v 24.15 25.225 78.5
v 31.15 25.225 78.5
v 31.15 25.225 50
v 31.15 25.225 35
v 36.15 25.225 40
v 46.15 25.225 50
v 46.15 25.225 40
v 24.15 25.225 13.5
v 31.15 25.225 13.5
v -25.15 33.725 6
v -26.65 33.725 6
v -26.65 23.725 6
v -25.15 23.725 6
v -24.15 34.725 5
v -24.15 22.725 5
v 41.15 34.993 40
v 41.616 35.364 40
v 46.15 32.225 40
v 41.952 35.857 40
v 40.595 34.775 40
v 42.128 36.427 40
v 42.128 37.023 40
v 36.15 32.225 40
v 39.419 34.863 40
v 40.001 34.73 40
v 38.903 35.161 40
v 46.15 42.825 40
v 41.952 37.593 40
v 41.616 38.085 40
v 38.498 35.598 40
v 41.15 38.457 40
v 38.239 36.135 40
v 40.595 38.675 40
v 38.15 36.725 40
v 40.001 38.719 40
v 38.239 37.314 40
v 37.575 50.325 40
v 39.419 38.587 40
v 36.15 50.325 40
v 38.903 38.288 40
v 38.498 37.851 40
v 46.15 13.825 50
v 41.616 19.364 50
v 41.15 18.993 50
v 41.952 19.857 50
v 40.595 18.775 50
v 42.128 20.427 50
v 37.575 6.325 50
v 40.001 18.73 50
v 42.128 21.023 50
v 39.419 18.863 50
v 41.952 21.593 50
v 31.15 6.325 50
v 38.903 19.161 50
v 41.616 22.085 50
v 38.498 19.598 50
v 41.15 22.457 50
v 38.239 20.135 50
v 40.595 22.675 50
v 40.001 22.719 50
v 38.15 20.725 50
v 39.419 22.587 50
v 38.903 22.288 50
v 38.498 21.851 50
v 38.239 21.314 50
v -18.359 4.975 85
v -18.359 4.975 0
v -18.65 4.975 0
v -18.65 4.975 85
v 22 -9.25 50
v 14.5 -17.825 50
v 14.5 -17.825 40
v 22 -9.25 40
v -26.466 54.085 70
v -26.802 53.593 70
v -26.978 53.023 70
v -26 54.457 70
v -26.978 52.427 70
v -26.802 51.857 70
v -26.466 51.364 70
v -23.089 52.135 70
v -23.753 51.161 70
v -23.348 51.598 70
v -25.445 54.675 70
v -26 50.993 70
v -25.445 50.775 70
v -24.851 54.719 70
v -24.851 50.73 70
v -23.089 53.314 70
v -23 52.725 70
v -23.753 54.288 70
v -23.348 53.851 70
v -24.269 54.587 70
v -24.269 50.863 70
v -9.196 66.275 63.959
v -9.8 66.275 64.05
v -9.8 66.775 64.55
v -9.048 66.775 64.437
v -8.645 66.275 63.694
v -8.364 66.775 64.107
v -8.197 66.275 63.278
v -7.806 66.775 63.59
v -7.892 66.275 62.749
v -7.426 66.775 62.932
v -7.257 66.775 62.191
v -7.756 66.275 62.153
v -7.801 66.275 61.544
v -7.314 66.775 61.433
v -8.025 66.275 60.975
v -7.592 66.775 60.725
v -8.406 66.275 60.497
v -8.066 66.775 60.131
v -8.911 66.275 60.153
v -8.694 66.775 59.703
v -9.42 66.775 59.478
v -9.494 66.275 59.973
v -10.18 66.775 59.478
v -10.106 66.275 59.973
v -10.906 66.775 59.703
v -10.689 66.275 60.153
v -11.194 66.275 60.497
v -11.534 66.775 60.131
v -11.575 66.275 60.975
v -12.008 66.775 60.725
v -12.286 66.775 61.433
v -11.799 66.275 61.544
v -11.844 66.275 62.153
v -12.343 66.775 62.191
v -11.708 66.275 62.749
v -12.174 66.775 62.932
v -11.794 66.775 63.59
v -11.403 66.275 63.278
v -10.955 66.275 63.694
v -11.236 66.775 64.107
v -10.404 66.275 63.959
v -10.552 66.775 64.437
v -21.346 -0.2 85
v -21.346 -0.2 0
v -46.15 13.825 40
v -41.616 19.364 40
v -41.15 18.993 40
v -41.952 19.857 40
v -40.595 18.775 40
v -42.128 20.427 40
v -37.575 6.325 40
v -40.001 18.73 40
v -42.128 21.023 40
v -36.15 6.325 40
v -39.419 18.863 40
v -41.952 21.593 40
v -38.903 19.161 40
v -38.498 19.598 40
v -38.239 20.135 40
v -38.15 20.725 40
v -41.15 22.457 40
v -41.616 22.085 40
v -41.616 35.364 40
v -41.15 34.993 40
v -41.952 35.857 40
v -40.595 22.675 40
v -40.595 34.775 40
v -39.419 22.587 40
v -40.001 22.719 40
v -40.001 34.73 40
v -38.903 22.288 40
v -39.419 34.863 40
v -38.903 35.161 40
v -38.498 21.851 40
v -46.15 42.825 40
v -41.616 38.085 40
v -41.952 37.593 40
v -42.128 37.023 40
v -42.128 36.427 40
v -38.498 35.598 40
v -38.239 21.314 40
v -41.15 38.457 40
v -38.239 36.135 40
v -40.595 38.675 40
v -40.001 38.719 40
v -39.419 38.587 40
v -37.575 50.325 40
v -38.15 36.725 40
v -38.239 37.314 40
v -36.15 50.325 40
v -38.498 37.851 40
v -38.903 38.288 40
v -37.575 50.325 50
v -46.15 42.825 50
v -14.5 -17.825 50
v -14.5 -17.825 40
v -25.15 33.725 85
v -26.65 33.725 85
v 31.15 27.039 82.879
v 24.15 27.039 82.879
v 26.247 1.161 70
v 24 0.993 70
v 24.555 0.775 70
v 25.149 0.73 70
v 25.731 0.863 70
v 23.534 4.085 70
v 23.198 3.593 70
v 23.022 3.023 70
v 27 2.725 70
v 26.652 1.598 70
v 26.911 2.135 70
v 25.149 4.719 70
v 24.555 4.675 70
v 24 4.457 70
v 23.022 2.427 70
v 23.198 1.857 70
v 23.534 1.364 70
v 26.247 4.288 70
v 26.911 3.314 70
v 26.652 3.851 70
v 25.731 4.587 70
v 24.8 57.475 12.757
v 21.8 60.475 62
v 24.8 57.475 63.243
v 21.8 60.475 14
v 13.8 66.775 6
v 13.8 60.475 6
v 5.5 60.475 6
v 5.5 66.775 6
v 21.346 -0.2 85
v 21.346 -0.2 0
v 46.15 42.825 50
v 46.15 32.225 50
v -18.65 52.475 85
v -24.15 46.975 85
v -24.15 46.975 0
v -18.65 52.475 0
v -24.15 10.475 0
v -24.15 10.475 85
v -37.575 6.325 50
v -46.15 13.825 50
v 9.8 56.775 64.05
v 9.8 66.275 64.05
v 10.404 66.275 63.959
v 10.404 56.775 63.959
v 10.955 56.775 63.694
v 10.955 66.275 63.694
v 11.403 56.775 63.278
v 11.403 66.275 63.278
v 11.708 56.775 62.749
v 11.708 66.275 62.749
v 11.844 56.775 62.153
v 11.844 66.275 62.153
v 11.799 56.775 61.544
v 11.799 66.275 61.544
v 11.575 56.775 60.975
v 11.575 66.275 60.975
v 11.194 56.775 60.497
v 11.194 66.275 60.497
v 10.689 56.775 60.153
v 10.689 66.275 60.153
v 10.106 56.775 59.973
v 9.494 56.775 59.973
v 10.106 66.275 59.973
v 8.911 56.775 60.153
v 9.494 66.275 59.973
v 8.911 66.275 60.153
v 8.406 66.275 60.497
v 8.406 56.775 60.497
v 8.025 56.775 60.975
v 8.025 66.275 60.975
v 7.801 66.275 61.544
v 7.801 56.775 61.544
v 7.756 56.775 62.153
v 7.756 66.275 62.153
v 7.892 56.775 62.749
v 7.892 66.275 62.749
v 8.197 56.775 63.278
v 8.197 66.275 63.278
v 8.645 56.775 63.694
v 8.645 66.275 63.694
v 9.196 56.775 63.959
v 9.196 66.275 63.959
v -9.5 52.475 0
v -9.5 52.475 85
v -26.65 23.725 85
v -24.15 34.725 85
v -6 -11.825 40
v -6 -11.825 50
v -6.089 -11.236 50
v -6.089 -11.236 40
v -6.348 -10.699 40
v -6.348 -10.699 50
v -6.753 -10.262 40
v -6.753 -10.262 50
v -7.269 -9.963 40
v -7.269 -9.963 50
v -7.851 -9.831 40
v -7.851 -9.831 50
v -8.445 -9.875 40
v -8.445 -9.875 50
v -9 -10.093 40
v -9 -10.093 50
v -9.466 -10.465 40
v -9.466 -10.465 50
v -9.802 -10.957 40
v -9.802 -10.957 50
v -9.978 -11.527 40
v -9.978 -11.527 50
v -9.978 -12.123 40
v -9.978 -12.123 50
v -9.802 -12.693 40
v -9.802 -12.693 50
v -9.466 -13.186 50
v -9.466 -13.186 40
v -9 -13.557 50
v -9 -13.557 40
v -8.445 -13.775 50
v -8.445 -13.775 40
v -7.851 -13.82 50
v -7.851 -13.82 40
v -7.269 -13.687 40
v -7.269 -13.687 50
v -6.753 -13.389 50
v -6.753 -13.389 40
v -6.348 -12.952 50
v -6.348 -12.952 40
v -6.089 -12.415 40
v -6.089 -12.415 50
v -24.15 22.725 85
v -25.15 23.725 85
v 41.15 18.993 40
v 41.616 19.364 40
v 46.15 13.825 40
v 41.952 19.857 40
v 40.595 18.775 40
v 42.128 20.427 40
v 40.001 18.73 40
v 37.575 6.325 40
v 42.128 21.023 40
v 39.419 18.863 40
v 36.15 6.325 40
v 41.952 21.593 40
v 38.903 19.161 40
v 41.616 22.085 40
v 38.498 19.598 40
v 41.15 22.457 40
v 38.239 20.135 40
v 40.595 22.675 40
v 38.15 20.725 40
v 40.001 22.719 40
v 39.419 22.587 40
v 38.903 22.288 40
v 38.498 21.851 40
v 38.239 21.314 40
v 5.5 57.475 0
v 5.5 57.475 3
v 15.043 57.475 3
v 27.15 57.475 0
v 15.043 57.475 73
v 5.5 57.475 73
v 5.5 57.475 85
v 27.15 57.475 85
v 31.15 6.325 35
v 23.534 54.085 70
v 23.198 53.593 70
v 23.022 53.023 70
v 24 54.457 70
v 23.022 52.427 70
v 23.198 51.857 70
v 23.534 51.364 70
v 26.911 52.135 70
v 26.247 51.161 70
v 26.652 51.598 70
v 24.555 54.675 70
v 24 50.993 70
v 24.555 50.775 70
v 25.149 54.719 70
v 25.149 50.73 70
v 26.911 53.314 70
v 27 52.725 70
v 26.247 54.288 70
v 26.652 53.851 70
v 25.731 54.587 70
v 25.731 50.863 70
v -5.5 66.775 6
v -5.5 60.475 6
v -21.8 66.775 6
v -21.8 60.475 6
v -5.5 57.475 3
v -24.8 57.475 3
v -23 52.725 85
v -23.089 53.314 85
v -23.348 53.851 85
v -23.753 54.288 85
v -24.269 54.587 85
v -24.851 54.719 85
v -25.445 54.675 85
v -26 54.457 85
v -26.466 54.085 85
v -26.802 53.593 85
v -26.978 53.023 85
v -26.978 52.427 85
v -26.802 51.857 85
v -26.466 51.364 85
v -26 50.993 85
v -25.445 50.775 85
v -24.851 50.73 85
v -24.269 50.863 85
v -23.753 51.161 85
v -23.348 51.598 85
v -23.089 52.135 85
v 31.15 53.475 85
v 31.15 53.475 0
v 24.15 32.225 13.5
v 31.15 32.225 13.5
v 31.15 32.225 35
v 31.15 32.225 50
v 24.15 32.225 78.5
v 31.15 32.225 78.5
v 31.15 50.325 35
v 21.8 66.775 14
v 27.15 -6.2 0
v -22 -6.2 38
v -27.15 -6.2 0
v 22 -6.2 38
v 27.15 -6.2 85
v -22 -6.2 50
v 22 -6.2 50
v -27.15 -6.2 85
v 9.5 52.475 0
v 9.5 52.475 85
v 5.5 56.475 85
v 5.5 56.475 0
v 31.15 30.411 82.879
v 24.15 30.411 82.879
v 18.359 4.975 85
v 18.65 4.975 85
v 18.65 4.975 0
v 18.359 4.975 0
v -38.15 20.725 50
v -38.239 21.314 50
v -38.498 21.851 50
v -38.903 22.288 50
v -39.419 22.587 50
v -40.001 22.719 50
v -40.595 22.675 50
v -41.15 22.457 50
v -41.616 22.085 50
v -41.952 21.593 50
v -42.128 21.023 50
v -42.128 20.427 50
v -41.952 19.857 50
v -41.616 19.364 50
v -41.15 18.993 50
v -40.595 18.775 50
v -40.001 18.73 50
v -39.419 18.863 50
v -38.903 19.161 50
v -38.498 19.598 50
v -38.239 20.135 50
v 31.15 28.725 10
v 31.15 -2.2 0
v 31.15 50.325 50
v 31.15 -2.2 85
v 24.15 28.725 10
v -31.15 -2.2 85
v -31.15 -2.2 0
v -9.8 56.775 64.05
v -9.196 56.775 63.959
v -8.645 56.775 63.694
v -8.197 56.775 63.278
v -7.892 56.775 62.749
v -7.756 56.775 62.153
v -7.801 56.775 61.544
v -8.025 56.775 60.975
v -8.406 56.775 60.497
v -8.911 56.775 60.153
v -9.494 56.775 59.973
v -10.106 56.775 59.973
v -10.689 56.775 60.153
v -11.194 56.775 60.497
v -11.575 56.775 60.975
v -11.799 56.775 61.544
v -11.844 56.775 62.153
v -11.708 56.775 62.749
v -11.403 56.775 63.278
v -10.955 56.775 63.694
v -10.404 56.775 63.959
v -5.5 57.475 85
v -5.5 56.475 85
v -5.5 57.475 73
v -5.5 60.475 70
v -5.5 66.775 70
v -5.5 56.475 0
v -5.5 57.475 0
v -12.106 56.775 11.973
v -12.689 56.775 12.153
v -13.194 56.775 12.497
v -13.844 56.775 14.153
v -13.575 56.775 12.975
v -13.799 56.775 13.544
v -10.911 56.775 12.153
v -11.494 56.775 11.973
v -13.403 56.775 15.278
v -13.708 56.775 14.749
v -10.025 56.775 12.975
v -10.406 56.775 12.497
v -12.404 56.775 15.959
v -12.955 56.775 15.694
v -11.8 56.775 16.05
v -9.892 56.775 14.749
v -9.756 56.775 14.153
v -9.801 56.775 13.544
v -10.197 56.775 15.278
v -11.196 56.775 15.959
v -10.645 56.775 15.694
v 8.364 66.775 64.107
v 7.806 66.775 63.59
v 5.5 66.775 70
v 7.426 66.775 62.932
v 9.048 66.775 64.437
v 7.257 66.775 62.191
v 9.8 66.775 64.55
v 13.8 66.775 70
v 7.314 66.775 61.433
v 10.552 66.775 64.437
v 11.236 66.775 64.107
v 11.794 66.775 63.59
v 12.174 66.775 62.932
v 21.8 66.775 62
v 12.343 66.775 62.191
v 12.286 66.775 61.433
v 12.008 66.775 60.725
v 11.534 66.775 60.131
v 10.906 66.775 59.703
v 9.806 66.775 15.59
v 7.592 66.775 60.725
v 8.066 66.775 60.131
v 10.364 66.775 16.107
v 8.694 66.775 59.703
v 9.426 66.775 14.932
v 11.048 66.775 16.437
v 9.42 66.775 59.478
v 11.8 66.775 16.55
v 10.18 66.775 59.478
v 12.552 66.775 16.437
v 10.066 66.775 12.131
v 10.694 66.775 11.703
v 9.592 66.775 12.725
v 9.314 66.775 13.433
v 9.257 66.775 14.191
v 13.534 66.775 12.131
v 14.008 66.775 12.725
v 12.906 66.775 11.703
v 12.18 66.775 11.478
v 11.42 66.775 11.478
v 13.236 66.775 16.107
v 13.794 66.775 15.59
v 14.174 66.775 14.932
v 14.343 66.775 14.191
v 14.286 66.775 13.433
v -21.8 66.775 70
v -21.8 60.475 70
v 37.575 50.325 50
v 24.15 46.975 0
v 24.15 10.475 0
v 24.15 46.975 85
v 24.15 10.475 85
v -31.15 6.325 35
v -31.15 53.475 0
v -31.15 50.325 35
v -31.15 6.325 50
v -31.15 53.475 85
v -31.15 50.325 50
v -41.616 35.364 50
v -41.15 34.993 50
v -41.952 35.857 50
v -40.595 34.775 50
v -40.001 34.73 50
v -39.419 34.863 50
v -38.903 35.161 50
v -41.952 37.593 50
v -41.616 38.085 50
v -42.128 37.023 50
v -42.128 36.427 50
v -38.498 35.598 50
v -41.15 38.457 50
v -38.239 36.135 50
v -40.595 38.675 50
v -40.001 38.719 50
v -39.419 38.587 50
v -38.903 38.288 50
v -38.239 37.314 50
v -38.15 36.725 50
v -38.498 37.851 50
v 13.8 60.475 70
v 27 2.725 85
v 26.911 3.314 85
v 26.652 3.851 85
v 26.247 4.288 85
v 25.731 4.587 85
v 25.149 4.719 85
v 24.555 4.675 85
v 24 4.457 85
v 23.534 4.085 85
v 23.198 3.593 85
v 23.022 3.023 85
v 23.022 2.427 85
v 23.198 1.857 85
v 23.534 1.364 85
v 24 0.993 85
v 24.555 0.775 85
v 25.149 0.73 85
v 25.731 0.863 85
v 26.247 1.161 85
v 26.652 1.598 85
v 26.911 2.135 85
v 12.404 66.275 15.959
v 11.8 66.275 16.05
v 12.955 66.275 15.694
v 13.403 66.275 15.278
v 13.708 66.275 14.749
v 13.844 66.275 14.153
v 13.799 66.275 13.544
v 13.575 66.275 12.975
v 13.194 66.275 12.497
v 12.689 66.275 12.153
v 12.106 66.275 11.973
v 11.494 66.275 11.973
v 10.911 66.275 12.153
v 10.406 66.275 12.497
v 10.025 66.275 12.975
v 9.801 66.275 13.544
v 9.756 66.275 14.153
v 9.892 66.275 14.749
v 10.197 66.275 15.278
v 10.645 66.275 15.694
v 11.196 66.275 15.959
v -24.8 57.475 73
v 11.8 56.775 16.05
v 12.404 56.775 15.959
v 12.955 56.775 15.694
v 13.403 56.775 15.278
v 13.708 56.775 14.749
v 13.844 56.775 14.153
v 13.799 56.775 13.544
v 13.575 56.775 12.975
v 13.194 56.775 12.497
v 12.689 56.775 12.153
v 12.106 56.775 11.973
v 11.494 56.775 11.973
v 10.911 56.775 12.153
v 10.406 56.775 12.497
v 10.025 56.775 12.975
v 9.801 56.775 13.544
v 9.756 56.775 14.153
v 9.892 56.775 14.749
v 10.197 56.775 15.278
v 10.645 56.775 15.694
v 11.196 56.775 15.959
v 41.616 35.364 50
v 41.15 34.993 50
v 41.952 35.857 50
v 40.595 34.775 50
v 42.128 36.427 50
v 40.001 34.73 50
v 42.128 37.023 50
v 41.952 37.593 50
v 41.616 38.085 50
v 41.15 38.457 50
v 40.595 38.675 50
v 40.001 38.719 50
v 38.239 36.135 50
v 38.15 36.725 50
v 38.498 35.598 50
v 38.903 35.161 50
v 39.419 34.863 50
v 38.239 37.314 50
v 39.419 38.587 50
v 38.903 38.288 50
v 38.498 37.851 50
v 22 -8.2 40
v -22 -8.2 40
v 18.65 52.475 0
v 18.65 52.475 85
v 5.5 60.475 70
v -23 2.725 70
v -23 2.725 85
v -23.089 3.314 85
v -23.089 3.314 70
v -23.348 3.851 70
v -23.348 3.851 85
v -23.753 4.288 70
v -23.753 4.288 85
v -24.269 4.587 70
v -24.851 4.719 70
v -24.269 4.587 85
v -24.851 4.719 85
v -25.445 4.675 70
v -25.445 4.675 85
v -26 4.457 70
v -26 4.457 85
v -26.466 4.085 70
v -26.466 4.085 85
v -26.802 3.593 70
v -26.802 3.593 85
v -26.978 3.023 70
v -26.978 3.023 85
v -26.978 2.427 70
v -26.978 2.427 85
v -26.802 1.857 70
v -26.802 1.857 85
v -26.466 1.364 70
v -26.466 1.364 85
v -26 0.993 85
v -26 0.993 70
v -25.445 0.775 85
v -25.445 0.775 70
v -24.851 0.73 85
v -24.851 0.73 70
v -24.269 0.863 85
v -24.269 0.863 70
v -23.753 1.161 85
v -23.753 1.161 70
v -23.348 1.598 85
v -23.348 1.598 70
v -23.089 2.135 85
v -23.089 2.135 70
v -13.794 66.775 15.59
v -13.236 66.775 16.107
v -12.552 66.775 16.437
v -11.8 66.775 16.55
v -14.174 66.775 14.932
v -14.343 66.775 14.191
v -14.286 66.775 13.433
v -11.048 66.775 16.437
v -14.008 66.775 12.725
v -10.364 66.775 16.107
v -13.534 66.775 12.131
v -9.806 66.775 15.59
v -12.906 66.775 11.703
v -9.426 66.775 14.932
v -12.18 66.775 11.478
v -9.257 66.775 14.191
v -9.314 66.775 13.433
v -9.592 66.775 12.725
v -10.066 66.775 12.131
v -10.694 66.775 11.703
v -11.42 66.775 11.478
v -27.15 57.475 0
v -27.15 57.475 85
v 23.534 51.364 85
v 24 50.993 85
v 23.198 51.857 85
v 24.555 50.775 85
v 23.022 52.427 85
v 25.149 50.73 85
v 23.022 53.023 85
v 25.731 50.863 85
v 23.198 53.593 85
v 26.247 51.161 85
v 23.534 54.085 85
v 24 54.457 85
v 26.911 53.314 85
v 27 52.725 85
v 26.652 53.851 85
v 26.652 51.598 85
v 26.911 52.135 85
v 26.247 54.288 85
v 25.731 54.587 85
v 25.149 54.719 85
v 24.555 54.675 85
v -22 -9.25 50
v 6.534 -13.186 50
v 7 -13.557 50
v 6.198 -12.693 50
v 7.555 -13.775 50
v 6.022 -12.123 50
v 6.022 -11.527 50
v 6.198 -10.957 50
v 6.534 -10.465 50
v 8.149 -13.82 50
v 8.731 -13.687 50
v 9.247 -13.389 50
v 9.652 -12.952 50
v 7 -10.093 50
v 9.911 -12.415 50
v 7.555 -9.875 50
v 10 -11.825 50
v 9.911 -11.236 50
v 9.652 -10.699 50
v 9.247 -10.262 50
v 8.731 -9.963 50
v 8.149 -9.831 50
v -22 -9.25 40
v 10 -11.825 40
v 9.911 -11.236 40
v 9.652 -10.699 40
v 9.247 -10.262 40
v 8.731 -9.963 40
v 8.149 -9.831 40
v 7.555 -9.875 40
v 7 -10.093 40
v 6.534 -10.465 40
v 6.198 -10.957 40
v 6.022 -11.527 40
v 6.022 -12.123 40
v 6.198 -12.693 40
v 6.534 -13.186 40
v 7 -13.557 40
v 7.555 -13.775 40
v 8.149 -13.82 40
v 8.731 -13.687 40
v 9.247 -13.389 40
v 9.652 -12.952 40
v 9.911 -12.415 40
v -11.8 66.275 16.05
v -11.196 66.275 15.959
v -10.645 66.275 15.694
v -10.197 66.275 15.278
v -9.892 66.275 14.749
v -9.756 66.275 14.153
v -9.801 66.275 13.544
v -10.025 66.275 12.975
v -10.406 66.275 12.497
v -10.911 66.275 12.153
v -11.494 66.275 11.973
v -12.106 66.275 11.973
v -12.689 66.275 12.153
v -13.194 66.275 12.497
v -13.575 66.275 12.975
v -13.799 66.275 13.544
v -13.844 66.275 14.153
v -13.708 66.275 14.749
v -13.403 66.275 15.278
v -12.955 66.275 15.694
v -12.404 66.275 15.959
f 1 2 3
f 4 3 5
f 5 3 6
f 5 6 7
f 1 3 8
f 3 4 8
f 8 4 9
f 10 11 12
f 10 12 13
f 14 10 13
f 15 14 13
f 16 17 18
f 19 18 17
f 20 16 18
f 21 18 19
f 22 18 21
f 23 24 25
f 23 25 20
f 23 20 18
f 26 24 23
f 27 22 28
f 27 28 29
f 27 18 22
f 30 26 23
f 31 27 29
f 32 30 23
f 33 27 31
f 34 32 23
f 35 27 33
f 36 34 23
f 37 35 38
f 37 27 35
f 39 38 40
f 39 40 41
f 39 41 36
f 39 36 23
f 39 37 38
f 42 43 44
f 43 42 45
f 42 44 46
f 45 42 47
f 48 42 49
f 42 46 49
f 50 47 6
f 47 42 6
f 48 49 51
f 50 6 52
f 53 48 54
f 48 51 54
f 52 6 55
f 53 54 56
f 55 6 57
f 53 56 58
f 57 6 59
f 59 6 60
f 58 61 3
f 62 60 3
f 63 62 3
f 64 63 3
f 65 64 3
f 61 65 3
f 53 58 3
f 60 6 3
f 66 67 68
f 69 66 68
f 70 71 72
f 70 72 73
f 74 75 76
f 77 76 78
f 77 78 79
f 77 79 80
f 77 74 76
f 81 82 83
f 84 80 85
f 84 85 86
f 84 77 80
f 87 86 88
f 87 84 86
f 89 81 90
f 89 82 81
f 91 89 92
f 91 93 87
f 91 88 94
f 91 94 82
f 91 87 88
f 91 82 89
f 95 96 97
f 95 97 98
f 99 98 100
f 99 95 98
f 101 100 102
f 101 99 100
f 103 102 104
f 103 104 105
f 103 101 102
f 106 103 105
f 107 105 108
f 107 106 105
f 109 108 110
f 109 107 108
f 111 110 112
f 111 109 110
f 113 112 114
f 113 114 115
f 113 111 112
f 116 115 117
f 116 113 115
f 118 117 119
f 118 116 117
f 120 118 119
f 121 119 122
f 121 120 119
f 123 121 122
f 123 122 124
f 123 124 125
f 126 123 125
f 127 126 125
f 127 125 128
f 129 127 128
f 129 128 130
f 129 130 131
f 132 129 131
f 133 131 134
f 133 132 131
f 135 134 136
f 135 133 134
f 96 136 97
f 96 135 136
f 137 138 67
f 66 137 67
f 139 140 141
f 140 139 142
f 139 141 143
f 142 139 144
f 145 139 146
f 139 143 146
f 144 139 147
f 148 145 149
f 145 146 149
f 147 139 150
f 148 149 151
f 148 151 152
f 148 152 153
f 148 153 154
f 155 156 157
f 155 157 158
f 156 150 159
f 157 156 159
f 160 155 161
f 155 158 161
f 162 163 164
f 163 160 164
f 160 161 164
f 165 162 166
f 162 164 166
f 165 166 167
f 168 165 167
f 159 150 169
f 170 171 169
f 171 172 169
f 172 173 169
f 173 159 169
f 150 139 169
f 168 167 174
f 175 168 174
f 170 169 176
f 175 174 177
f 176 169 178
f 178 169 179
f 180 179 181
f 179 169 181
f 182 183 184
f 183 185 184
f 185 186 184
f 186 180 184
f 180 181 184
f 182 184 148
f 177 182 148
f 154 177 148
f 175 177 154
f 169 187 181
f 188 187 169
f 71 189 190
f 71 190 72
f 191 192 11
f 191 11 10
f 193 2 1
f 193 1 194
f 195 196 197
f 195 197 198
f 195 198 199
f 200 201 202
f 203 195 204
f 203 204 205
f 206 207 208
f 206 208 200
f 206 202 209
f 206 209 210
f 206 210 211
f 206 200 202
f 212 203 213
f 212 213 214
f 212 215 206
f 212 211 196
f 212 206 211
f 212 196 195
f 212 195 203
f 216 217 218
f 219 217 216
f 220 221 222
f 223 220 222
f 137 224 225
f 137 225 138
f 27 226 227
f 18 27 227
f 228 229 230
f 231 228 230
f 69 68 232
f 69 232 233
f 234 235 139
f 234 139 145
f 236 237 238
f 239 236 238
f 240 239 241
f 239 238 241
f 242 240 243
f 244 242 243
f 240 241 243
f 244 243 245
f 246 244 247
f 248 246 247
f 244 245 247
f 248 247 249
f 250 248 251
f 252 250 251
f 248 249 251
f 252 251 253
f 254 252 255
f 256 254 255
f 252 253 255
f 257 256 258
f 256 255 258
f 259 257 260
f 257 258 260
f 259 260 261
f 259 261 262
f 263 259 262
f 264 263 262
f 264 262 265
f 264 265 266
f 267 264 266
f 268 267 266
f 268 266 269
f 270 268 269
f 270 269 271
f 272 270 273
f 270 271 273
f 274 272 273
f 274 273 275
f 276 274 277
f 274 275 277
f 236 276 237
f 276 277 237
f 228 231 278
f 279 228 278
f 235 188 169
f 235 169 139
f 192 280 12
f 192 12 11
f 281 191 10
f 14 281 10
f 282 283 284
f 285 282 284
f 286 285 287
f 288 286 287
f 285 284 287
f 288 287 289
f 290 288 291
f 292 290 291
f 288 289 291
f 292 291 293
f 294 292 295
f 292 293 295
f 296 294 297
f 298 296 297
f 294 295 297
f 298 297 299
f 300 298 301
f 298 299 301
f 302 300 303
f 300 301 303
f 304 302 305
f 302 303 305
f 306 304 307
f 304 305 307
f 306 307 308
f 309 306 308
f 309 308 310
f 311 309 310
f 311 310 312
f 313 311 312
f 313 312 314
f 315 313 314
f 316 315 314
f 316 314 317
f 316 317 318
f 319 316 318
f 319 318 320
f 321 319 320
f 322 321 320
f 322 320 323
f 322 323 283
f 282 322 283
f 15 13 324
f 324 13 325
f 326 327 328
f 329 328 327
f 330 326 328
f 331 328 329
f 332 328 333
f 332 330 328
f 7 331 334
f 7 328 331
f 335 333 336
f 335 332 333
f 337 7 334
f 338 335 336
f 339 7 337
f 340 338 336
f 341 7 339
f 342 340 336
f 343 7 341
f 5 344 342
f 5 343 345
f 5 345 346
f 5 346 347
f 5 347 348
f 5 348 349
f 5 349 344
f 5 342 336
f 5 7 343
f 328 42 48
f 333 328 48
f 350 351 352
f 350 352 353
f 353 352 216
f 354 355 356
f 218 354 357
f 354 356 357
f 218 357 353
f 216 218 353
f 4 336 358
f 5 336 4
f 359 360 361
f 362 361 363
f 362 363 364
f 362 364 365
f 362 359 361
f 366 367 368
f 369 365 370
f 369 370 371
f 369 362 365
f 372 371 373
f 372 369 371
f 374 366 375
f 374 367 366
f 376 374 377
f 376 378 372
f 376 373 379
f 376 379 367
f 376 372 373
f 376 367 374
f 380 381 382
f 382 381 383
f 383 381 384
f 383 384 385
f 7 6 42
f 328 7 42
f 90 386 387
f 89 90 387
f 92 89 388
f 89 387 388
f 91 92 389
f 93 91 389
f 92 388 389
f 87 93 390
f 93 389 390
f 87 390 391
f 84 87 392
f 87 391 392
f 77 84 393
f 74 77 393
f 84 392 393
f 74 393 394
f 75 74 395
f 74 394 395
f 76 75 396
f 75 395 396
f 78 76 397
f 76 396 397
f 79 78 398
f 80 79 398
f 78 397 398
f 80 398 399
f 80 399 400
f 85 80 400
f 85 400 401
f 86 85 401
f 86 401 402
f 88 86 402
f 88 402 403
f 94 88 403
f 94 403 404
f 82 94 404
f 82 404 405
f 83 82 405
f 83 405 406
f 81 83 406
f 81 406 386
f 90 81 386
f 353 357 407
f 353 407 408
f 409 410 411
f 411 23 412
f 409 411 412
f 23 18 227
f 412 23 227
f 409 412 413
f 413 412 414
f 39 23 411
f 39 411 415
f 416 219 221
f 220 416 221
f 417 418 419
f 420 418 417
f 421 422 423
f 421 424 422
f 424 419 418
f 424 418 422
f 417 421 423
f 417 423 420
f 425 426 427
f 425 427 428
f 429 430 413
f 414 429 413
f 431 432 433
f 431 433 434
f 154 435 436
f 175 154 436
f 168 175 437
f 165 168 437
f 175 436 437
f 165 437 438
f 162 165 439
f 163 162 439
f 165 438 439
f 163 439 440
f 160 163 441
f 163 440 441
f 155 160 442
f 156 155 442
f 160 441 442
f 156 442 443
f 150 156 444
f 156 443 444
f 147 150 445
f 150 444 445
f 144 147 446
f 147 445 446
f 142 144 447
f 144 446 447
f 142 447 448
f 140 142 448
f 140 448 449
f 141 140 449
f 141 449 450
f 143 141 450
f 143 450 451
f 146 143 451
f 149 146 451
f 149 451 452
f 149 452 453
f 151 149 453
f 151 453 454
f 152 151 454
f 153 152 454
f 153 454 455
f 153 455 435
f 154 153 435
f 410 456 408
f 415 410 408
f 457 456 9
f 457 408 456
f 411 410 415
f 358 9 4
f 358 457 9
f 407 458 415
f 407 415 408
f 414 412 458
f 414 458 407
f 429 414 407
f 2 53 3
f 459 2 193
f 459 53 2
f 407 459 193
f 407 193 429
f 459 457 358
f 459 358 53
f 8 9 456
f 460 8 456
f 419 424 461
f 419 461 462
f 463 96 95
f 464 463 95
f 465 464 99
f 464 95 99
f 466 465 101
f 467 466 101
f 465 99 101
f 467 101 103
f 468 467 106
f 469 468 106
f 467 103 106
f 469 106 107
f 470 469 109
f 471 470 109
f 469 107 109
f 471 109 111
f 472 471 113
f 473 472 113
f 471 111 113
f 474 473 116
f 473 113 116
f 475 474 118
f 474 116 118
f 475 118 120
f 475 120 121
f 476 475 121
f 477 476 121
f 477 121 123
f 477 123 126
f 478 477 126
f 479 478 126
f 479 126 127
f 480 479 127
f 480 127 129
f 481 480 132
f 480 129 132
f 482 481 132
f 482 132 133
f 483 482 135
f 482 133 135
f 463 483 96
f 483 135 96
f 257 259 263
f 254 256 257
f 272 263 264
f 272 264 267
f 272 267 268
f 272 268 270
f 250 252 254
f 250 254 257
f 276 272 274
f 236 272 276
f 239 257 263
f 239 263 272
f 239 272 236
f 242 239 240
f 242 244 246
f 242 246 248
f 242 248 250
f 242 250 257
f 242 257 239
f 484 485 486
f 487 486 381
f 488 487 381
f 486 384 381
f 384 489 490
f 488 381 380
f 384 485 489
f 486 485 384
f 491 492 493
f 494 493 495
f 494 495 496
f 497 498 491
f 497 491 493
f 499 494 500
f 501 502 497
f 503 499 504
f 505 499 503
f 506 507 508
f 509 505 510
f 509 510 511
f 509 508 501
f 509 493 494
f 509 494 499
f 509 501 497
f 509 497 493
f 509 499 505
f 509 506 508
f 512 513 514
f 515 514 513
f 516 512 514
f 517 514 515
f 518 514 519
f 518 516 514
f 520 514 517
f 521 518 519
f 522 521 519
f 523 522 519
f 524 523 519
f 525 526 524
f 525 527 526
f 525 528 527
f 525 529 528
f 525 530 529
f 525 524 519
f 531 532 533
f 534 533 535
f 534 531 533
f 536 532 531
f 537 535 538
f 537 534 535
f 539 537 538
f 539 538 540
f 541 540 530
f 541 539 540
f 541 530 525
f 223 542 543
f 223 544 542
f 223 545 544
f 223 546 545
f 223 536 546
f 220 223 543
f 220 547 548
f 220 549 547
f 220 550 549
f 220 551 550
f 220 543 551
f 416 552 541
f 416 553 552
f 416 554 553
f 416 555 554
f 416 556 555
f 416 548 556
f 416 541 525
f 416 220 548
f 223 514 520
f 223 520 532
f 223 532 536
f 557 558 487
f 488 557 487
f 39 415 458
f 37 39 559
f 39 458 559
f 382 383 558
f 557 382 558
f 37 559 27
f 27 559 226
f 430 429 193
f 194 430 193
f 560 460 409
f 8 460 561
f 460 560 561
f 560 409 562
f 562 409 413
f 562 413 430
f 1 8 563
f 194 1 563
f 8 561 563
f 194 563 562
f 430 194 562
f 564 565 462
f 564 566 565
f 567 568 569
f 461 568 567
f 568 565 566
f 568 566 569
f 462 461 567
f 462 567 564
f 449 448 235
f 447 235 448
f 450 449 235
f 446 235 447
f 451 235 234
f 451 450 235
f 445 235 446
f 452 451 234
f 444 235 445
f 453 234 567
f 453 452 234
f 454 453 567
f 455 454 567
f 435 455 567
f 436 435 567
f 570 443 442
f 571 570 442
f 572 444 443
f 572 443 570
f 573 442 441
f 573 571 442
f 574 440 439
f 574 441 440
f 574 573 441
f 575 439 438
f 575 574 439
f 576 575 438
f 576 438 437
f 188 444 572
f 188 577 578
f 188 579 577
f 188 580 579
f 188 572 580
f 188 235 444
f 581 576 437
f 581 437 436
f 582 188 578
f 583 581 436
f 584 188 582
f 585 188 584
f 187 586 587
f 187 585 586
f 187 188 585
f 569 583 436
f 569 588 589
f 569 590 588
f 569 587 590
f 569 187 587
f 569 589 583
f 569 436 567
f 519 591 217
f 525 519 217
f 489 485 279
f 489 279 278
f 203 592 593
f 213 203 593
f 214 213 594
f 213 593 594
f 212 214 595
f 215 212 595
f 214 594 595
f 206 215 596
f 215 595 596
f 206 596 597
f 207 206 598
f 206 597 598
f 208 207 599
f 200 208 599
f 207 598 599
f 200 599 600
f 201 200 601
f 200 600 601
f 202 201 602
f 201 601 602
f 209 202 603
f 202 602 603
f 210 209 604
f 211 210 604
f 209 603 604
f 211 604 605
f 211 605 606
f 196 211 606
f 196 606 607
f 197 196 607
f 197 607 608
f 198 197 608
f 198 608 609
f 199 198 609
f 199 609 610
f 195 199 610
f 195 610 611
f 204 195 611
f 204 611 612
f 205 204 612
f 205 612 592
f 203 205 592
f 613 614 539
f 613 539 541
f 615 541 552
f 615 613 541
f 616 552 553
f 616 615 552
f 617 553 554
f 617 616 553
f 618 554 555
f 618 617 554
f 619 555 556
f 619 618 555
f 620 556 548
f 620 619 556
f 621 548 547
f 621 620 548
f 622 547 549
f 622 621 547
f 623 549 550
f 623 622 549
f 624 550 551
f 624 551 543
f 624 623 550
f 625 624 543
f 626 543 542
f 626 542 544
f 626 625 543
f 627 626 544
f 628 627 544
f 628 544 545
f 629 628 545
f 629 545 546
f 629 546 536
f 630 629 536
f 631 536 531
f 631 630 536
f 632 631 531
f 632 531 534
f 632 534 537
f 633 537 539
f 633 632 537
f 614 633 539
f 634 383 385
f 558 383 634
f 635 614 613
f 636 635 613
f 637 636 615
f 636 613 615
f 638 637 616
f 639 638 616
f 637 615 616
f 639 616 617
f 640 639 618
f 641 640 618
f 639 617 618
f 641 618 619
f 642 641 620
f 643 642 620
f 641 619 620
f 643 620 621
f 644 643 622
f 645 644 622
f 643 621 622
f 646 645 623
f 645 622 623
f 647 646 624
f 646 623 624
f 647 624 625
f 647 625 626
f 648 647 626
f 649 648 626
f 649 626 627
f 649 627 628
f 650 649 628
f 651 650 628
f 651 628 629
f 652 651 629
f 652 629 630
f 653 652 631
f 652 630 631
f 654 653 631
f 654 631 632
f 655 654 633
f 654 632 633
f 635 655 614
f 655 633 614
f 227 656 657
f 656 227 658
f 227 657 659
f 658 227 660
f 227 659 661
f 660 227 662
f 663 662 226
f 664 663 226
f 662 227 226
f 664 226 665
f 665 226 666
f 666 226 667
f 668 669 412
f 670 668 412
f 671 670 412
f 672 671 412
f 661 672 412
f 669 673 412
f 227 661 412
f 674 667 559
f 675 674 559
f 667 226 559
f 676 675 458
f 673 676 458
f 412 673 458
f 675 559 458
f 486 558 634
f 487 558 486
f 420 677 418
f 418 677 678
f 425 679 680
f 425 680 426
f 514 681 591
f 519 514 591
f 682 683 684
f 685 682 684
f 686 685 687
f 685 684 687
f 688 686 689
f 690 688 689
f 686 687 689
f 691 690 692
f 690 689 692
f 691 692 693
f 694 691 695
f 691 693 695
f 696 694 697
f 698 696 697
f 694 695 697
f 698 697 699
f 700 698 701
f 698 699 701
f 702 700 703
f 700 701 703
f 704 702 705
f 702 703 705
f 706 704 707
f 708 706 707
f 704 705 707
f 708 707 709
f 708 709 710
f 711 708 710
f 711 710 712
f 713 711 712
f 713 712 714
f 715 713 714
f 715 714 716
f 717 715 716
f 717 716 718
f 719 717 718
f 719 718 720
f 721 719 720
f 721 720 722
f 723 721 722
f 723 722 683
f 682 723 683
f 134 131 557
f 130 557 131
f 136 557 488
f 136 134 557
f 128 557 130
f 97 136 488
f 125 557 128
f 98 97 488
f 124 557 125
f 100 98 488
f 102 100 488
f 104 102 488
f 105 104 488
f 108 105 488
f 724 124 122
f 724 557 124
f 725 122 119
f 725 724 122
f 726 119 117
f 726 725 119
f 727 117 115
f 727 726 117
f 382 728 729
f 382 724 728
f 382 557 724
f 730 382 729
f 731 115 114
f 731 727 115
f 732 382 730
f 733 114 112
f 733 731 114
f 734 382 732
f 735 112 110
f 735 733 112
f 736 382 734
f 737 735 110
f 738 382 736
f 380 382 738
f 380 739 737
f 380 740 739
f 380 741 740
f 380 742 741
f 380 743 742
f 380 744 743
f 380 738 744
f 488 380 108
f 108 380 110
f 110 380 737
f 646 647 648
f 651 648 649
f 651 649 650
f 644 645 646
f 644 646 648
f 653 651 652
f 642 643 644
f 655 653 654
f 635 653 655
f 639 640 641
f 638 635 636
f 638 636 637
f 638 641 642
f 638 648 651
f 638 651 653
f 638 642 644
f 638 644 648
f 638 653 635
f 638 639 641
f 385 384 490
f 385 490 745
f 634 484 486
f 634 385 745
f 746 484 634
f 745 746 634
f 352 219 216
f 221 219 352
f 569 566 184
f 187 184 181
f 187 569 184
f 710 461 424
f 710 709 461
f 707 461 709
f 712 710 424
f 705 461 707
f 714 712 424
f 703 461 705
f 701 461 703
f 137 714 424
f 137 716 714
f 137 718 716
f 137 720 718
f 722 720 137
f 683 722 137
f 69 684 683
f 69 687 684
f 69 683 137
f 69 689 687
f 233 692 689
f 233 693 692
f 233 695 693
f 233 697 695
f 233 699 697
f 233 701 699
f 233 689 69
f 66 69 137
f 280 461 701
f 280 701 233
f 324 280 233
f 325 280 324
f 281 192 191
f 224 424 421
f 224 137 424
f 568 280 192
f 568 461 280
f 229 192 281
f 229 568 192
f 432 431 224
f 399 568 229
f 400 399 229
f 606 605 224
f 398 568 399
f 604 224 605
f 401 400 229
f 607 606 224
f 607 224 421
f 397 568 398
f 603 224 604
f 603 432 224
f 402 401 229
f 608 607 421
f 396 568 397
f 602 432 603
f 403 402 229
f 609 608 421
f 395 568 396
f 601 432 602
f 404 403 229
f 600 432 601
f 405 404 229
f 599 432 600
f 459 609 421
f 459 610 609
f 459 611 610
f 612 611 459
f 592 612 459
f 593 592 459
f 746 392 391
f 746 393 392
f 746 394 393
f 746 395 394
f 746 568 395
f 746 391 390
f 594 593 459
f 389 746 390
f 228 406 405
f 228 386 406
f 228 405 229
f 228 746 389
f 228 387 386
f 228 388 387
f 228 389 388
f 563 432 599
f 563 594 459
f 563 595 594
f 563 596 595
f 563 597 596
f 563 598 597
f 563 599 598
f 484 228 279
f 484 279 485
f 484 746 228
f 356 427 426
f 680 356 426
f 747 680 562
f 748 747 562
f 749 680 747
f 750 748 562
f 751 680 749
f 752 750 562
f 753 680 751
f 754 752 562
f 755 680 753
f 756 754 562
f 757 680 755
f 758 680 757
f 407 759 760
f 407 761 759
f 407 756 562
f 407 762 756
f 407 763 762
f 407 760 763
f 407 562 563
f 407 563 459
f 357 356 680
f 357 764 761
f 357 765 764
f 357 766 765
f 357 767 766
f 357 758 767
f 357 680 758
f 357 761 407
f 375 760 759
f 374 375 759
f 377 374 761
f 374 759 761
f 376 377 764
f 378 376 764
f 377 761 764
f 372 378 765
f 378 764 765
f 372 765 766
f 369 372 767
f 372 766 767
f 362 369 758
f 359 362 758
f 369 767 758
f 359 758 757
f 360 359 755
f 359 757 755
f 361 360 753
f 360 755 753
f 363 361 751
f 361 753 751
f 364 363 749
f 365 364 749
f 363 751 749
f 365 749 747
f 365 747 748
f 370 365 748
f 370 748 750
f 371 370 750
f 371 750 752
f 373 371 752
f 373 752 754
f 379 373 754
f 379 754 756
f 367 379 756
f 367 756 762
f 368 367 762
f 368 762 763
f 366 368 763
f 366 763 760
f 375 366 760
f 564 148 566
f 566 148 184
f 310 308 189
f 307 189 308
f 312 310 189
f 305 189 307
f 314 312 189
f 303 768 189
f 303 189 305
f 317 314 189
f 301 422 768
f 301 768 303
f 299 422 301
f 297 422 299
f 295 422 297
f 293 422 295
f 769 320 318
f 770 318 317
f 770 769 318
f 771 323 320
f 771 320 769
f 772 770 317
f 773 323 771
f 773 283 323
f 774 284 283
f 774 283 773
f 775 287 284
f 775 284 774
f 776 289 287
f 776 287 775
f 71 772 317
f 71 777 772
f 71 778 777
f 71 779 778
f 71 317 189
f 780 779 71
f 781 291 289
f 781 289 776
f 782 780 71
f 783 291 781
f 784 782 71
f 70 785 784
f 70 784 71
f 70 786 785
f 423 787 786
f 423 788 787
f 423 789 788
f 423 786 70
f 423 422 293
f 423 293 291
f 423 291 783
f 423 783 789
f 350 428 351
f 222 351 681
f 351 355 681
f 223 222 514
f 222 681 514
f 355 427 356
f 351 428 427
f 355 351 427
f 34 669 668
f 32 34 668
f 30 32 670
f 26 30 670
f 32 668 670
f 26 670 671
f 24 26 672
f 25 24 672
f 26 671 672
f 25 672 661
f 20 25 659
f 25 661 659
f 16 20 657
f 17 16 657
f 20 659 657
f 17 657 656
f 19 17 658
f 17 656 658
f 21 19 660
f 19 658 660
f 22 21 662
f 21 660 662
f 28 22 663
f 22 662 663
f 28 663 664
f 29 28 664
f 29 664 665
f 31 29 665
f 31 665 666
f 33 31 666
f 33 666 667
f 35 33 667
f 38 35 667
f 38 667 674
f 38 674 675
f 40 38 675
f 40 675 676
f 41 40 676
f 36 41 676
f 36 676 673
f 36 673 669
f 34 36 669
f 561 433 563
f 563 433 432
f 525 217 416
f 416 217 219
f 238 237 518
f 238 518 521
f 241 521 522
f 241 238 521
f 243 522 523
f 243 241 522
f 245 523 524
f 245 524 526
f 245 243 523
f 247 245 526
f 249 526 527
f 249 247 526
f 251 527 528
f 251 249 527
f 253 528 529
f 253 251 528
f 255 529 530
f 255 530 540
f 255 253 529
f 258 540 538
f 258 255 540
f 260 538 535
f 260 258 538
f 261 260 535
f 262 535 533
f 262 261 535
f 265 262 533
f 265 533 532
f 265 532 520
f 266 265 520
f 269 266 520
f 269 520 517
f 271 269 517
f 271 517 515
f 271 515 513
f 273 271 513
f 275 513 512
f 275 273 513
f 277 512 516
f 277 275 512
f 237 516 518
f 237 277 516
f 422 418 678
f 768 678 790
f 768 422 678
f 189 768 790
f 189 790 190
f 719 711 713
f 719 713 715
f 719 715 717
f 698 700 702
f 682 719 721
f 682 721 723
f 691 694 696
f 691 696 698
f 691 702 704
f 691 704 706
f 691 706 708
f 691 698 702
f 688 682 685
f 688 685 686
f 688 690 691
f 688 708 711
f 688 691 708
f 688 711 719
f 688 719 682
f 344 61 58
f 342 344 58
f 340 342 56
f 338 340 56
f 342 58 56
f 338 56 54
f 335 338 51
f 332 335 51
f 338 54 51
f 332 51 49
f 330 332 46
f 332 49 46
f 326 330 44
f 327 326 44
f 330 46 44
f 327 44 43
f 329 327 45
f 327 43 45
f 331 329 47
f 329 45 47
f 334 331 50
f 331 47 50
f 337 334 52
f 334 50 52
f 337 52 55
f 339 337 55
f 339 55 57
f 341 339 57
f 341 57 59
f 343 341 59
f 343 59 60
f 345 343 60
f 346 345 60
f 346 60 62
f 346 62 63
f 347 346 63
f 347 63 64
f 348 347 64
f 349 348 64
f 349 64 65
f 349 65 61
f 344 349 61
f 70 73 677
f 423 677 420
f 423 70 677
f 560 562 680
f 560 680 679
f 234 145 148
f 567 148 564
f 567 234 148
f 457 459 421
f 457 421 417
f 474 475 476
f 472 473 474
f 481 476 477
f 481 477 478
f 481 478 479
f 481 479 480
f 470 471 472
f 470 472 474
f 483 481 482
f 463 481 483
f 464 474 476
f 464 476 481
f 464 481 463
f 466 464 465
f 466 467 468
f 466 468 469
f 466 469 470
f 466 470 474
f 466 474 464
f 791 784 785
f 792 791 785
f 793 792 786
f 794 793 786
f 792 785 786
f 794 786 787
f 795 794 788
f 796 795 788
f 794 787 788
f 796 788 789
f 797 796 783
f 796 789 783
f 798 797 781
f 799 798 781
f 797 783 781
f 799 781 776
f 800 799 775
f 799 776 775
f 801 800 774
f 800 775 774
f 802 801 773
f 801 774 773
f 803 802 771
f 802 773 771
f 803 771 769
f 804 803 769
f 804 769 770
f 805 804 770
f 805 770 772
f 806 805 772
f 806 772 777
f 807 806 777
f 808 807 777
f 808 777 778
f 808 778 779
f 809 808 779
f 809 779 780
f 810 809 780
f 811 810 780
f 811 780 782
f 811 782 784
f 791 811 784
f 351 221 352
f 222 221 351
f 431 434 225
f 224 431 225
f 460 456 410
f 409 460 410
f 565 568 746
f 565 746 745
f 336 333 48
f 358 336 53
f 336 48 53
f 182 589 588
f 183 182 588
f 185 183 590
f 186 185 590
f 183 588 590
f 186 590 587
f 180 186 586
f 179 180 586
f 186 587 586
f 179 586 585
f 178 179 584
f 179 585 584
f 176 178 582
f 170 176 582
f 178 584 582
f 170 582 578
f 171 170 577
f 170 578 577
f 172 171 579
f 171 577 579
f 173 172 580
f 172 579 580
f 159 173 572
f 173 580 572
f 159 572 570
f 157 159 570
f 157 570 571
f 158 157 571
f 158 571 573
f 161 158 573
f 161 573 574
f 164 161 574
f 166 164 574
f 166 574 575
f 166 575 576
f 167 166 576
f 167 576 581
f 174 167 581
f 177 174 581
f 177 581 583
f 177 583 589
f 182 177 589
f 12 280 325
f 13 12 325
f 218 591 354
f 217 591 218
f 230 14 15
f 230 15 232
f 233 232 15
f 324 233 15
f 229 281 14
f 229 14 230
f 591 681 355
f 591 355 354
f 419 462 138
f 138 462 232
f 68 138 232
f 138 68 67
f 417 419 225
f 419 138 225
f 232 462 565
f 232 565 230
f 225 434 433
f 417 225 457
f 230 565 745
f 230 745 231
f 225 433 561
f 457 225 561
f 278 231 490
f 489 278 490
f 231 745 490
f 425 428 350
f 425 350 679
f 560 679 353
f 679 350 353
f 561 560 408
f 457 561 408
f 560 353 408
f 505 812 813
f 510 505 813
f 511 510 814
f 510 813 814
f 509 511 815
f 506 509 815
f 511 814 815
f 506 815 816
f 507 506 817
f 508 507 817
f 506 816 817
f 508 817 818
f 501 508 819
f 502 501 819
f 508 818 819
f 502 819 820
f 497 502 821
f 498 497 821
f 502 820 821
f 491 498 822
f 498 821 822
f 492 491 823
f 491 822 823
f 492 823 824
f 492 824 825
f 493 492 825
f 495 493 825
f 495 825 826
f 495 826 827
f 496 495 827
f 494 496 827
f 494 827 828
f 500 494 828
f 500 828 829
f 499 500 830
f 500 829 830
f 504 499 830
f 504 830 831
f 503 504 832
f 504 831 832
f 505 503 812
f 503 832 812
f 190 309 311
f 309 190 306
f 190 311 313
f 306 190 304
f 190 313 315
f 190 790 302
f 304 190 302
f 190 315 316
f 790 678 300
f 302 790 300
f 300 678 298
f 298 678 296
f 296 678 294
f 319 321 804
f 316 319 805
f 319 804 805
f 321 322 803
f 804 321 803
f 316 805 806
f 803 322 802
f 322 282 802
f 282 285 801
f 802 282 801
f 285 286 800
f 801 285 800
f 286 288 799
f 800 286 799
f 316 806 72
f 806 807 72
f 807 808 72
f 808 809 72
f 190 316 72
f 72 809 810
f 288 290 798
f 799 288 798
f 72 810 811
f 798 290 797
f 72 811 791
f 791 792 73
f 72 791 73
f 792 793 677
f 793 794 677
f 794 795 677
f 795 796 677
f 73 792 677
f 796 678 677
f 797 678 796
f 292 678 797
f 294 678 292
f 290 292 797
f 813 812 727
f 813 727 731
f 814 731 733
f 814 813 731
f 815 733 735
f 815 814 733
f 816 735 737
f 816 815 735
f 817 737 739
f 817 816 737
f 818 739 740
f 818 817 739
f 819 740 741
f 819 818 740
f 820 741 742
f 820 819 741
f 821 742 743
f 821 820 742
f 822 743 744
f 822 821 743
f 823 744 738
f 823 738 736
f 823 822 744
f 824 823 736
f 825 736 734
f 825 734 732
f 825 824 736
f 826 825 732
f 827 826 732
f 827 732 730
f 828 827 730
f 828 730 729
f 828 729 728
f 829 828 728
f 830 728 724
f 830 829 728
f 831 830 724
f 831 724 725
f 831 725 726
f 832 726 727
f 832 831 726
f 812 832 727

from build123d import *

# Parameters (mm, degrees)
BOSS_EXTRUDE1_DEPTH     = 100
BOSS_EXTRUDE2_DEPTH     = 100
CUT_EXTRUDE1_DEPTH      = 10
CHAMFER1_SIZE           = 5.5
CHAMFER2_SIZE           = 4
SKETCH8_R               = 2
BOSS_EXTRUDE3_DEPTH     = 9.3
CUT_EXTRUDE3_DEPTH      = 125.214315536
CUT_EXTRUDE3_DEPTH_BACK = 10
SKETCH9_W               = 11
SKETCH9_H               = 9.3
CHAMFER3_SIZE           = 4
CHAMFER4_SIZE           = 3
CHAMFER5_SIZE           = 3
SKETCH10_W              = 5
SKETCH10_H              = 10
CUT_EXTRUDE4_DEPTH      = 94
CHAMFER7_SIZE           = 1
CHAMFER8_SIZE           = 1
SKETCH11_R              = 2.05
CUT_EXTRUDE5_DEPTH      = 10
CHAMFER9_SIZE           = 0.5
SKETCH12_R              = 2
CUT_EXTRUDE6_DEPTH      = 30
BOSS_EXTRUDE6_START     = -2
BOSS_EXTRUDE6_DEPTH     = 10
SKETCH17_R              = 2
CUT_EXTRUDE7_DEPTH      = 17.1
SKETCH19_W              = 50
SKETCH19_H              = 7
CUT_EXTRUDE13_DEPTH     = 17.1
SKETCH20_W              = 62.3
SKETCH20_H              = 63.674798271
CUT_EXTRUDE14_DEPTH     = 15
CHAMFER10_SIZE          = 5
CHAMFER11_SIZE          = 2


with BuildPart() as part:
    # Sketch4 → Boss-Extrude1 (new body)
    with BuildSketch(Plane.XY):
        Polygon((-18.358738987, 4.974798271), (-27, 4.974798271), (-27, -6.2), (27, -6.2), (27, 4.974798271), (18.358738987, 4.974798271), (21.346410162, -0.2), (-21.346410162, -0.2), align=None)
    extrude(amount=BOSS_EXTRUDE1_DEPTH)

    # Sketch6 → Boss-Extrude2 (add)
    with BuildSketch(Plane.XY.offset(100)):
        Polygon((-24.15, 4.974798271), (-24.15, 52.474798271), (-5.5, 52.474798271), (-5.5, 57.474798271), (-31.15, 57.474798271), (-31.15, -6.2), (-24.15, -6.2), align=None)
        Polygon((24.15, -6.2), (24.15, 52.474798271), (5.5, 52.474798271), (5.5, 57.474798271), (31.15, 57.474798271), (31.15, -6.2), align=None)
    extrude(amount=-BOSS_EXTRUDE2_DEPTH)

    # Sketch7 → Cut-Extrude1 (cut)
    with BuildSketch(Plane(origin=(31.15, 0, 0), x_dir=(0, 0, -1), z_dir=(1, 0, 0))):
        Polygon((-85, 28.724798271), (-81.5, 25.224798271), (-13.5, 25.224798271), (-10, 28.724798271), (-13.5, 32.224798271), (-81.5, 32.224798271), align=None)
    extrude(amount=-CUT_EXTRUDE1_DEPTH, mode=Mode.SUBTRACT)

    # Chamfer1
    chamfer1_edges = [part.edges().sort_by_distance(p)[0] for p in [
        (-24.15, 52.474798271, 50),
        (-24.15, 4.974798271, 50),
        (24.15, 4.974798271, 50),
        (24.15, 52.474798271, 50),
    ]]
    chamfer(chamfer1_edges, length=CHAMFER1_SIZE)

    # Chamfer2
    chamfer2_edges = [part.edges().sort_by_distance(p)[0] for p in [
        (-5.5, 52.474798271, 50),
        (5.5, 52.474798271, 50),
    ]]
    chamfer(chamfer2_edges, length=CHAMFER2_SIZE)

    # Sketch8 → Boss-Extrude3 (add)
    with BuildSketch(Plane(origin=(0, 57.474798271, 0), x_dir=(1, 0, 0), z_dir=(0, 1, 0))):
        Polygon((-21.8, -70), (13.8, -70), (21.8, -62), (21.8, -14), (13.8, -6), (-21.8, -6), align=None)
        with Locations(Location((9.8, -62, 0), (0, 0, 270))):
            Circle(SKETCH8_R, mode=Mode.SUBTRACT)
        with Locations(Location((11.8, -14, 0), (0, 0, 270))):
            Circle(SKETCH8_R, mode=Mode.SUBTRACT)
        with Locations(Location((-11.8, -14, 0), (0, 0, 270))):
            Circle(SKETCH8_R, mode=Mode.SUBTRACT)
        with Locations(Location((-9.8, -62, 0), (0, 0, 270))):
            Circle(SKETCH8_R, mode=Mode.SUBTRACT)
    extrude(amount=BOSS_EXTRUDE3_DEPTH)

    # Sketch9 → Cut-Extrude3 (cut, two sides: drawn at the far end of the back side and taken through both)
    with BuildSketch(Plane.XY.offset(-CUT_EXTRUDE3_DEPTH_BACK)):
        with Locations((0, 62.124798271)):
            Rectangle(SKETCH9_W, SKETCH9_H)
    extrude(amount=CUT_EXTRUDE3_DEPTH + CUT_EXTRUDE3_DEPTH_BACK, mode=Mode.SUBTRACT)

    # Chamfer3
    chamfer3_edges = [part.edges().sort_by_distance(p)[0] for p in [
        (-31.15, -6.2, 50),
        (-31.15, 57.474798271, 50),
        (31.15, -6.2, 50),
        (31.15, 57.474798271, 50),
    ]]
    chamfer(chamfer3_edges, length=CHAMFER3_SIZE)

    # Chamfer4
    chamfer4_edges = [part.edges().sort_by_distance(p)[0] for p in [
        (9.65, 57.474798271, 70),
        (-21.8, 57.474798271, 38),
        (-13.65, 57.474798271, 70),
        (17.8, 57.474798271, 66),
        (21.8, 57.474798271, 38),
        (17.8, 57.474798271, 10),
        (9.65, 57.474798271, 6),
        (-13.65, 57.474798271, 6),
    ]]
    chamfer(chamfer4_edges, length=CHAMFER4_SIZE)

    # Chamfer5
    # the kernel refuses this chamfer: 3 mm, written as the material it adds along each edge
    with BuildSketch(Plane(origin=(31.15, 25.224798271, 81.5), x_dir=(0, -0.014760203742521738, -0.9998910622590239), z_dir=(-1, 0, 0)), Plane(origin=(31.15, 32.224798271, 81.5), x_dir=(0, -0.6965927104131427, 0.7174667907292097), z_dir=(-1, 0, 0))) as chamfer5_piece_1:
        Polygon((CHAMFER5_SIZE * 0.999891062259, -CHAMFER5_SIZE * 0.0147602037425), (-CHAMFER5_SIZE * 0.717466790729, -CHAMFER5_SIZE * 0.696592710413), (0, 0), align=None)
    extrude(amount=7)
    with BuildSketch(Plane(origin=(31.15, 28.724798271, 85), x_dir=(0, 0.7262819568766863, -0.687396915264661), z_dir=(-1, 0, 0))) as chamfer5_piece_2:
        Polygon((CHAMFER5_SIZE * 0.999621916911, CHAMFER5_SIZE * 0.0274958766106), (-CHAMFER5_SIZE * 0.0274958766106, CHAMFER5_SIZE * 0.999621916911), (0, 0), align=None)
    extrude(amount=7)

    # Sketch10 → Cut-Extrude4 (cut)
    with BuildSketch(Plane.XY.offset(100)):
        with Locations((-24.15, 28.724798271)):
            Rectangle(SKETCH10_W, SKETCH10_H)
    extrude(amount=-CUT_EXTRUDE4_DEPTH, mode=Mode.SUBTRACT)

    # Chamfer7
    chamfer7_edges = [part.edges().sort_by_distance(p)[0] for p in [
        (-24.15, 28.724798271, 6),
    ]]
    chamfer(chamfer7_edges, length=CHAMFER7_SIZE)

    # Chamfer8
    chamfer8_edges = [part.edges().sort_by_distance(p)[0] for p in [
        (-24.15, 23.724798271, 52.5),
        (-24.15, 33.724798271, 52.5),
    ]]
    chamfer(chamfer8_edges, length=CHAMFER8_SIZE)

    # Sketch11 → Cut-Extrude5 (cut)
    with BuildSketch(Plane(origin=(0, 66.774798271, 0), x_dir=(1, 0, 0), z_dir=(0, 1, 0))):
        with Locations(Location((-11.8, -14, 0), (0, 0, 270))):
            Circle(SKETCH11_R)
        with Locations(Location((11.8, -14, 0), (0, 0, 270))):
            Circle(SKETCH11_R)
        with Locations(Location((-9.8, -62, 0), (0, 0, 270))):
            Circle(SKETCH11_R)
        with Locations(Location((9.8, -62, 0), (0, 0, 270))):
            Circle(SKETCH11_R)
    extrude(amount=-CUT_EXTRUDE5_DEPTH, mode=Mode.SUBTRACT)

    # Chamfer9
    chamfer9_edges = [part.edges().sort_by_distance(p)[0] for p in [
        (11.8, 66.774798271, 11.95),
        (-9.8, 66.774798271, 59.95),
        (9.8, 66.774798271, 59.95),
        (-11.8, 66.774798271, 11.95),
    ]]
    chamfer(chamfer9_edges, length=CHAMFER9_SIZE)

    # Sketch12 → Cut-Extrude6 (cut)
    with BuildSketch(Plane.XY.offset(100)):
        with Locations((-25, 52.724798271)):
            Circle(SKETCH12_R)
        with Locations((25, 52.724798271)):
            Circle(SKETCH12_R)
        with Locations((-25, 2.724798271)):
            Circle(SKETCH12_R)
        with Locations((25, 2.724798271)):
            Circle(SKETCH12_R)
    extrude(amount=-CUT_EXTRUDE6_DEPTH, mode=Mode.SUBTRACT)

    # Sketch16 → Boss-Extrude6 (add)
    with BuildSketch(Plane(origin=(0, 0, 48), x_dir=(-1, 0, 0), z_dir=(0, 0, -1)).offset(BOSS_EXTRUDE6_START)):
        Polygon((-22, -0.675201729), (22, -0.675201729), (22, -9.250201729), (14.5, -17.825201729), (-14.5, -17.825201729), (-22, -9.250201729), align=None)
        Polygon((-29, 50.324798271), (-37.575, 50.324798271), (-46.15, 42.824798271), (-46.15, 13.824798271), (-37.575, 6.324798271), (-29, 6.324798271), align=None)
        Polygon((37.575, 6.324798271), (29, 6.324798271), (29, 50.324798271), (37.575, 50.324798271), (46.15, 42.824798271), (46.15, 13.824798271), align=None)
    extrude(amount=BOSS_EXTRUDE6_DEPTH)

    # Sketch17 → Cut-Extrude7 (cut)
    with BuildSketch(Plane.XY.offset(50)):
        with Locations((-40.15, 36.724798271)):
            Circle(SKETCH17_R)
        with Locations((-40.15, 20.724798271)):
            Circle(SKETCH17_R)
        with Locations(Location((40.15, 20.724798271, 0), (0, 0, 180))):
            Circle(SKETCH17_R)
        with Locations(Location((40.15, 36.724798271, 0), (0, 0, 180))):
            Circle(SKETCH17_R)
        with Locations((-8, -11.825201729)):
            Circle(SKETCH17_R)
        with Locations((8, -11.825201729)):
            Circle(SKETCH17_R)
    extrude(amount=-CUT_EXTRUDE7_DEPTH, mode=Mode.SUBTRACT)

    # Sketch19 → Cut-Extrude13 (cut)
    with BuildSketch(Plane(origin=(0, 0, 40), x_dir=(-1, 0, 0), z_dir=(0, 0, -1))):
        with Locations((-49.15, 28.724798271)):
            Rectangle(SKETCH19_W, SKETCH19_H)
    extrude(amount=-CUT_EXTRUDE13_DEPTH, mode=Mode.SUBTRACT)

    # Sketch20 → Cut-Extrude14 (cut)
    with BuildSketch(Plane.XY.offset(100)):
        with Locations((0, 25.637399136)):
            Rectangle(SKETCH20_W, SKETCH20_H)
    extrude(amount=-CUT_EXTRUDE14_DEPTH, mode=Mode.SUBTRACT)

    # Chamfer10
    chamfer10_edges = [part.edges().sort_by_distance(p)[0] for p in [
        (-31.15, 28.324798271, 40),
        (31.15, 41.274798271, 40),
        (31.15, 15.774798271, 40),
    ]]
    chamfer(chamfer10_edges, length=CHAMFER10_SIZE)

    # Chamfer11
    chamfer11_edges = [part.edges().sort_by_distance(p)[0] for p in [
        (0, -6.2, 40),
    ]]
    chamfer(chamfer11_edges, length=CHAMFER11_SIZE)


solid = part.part
